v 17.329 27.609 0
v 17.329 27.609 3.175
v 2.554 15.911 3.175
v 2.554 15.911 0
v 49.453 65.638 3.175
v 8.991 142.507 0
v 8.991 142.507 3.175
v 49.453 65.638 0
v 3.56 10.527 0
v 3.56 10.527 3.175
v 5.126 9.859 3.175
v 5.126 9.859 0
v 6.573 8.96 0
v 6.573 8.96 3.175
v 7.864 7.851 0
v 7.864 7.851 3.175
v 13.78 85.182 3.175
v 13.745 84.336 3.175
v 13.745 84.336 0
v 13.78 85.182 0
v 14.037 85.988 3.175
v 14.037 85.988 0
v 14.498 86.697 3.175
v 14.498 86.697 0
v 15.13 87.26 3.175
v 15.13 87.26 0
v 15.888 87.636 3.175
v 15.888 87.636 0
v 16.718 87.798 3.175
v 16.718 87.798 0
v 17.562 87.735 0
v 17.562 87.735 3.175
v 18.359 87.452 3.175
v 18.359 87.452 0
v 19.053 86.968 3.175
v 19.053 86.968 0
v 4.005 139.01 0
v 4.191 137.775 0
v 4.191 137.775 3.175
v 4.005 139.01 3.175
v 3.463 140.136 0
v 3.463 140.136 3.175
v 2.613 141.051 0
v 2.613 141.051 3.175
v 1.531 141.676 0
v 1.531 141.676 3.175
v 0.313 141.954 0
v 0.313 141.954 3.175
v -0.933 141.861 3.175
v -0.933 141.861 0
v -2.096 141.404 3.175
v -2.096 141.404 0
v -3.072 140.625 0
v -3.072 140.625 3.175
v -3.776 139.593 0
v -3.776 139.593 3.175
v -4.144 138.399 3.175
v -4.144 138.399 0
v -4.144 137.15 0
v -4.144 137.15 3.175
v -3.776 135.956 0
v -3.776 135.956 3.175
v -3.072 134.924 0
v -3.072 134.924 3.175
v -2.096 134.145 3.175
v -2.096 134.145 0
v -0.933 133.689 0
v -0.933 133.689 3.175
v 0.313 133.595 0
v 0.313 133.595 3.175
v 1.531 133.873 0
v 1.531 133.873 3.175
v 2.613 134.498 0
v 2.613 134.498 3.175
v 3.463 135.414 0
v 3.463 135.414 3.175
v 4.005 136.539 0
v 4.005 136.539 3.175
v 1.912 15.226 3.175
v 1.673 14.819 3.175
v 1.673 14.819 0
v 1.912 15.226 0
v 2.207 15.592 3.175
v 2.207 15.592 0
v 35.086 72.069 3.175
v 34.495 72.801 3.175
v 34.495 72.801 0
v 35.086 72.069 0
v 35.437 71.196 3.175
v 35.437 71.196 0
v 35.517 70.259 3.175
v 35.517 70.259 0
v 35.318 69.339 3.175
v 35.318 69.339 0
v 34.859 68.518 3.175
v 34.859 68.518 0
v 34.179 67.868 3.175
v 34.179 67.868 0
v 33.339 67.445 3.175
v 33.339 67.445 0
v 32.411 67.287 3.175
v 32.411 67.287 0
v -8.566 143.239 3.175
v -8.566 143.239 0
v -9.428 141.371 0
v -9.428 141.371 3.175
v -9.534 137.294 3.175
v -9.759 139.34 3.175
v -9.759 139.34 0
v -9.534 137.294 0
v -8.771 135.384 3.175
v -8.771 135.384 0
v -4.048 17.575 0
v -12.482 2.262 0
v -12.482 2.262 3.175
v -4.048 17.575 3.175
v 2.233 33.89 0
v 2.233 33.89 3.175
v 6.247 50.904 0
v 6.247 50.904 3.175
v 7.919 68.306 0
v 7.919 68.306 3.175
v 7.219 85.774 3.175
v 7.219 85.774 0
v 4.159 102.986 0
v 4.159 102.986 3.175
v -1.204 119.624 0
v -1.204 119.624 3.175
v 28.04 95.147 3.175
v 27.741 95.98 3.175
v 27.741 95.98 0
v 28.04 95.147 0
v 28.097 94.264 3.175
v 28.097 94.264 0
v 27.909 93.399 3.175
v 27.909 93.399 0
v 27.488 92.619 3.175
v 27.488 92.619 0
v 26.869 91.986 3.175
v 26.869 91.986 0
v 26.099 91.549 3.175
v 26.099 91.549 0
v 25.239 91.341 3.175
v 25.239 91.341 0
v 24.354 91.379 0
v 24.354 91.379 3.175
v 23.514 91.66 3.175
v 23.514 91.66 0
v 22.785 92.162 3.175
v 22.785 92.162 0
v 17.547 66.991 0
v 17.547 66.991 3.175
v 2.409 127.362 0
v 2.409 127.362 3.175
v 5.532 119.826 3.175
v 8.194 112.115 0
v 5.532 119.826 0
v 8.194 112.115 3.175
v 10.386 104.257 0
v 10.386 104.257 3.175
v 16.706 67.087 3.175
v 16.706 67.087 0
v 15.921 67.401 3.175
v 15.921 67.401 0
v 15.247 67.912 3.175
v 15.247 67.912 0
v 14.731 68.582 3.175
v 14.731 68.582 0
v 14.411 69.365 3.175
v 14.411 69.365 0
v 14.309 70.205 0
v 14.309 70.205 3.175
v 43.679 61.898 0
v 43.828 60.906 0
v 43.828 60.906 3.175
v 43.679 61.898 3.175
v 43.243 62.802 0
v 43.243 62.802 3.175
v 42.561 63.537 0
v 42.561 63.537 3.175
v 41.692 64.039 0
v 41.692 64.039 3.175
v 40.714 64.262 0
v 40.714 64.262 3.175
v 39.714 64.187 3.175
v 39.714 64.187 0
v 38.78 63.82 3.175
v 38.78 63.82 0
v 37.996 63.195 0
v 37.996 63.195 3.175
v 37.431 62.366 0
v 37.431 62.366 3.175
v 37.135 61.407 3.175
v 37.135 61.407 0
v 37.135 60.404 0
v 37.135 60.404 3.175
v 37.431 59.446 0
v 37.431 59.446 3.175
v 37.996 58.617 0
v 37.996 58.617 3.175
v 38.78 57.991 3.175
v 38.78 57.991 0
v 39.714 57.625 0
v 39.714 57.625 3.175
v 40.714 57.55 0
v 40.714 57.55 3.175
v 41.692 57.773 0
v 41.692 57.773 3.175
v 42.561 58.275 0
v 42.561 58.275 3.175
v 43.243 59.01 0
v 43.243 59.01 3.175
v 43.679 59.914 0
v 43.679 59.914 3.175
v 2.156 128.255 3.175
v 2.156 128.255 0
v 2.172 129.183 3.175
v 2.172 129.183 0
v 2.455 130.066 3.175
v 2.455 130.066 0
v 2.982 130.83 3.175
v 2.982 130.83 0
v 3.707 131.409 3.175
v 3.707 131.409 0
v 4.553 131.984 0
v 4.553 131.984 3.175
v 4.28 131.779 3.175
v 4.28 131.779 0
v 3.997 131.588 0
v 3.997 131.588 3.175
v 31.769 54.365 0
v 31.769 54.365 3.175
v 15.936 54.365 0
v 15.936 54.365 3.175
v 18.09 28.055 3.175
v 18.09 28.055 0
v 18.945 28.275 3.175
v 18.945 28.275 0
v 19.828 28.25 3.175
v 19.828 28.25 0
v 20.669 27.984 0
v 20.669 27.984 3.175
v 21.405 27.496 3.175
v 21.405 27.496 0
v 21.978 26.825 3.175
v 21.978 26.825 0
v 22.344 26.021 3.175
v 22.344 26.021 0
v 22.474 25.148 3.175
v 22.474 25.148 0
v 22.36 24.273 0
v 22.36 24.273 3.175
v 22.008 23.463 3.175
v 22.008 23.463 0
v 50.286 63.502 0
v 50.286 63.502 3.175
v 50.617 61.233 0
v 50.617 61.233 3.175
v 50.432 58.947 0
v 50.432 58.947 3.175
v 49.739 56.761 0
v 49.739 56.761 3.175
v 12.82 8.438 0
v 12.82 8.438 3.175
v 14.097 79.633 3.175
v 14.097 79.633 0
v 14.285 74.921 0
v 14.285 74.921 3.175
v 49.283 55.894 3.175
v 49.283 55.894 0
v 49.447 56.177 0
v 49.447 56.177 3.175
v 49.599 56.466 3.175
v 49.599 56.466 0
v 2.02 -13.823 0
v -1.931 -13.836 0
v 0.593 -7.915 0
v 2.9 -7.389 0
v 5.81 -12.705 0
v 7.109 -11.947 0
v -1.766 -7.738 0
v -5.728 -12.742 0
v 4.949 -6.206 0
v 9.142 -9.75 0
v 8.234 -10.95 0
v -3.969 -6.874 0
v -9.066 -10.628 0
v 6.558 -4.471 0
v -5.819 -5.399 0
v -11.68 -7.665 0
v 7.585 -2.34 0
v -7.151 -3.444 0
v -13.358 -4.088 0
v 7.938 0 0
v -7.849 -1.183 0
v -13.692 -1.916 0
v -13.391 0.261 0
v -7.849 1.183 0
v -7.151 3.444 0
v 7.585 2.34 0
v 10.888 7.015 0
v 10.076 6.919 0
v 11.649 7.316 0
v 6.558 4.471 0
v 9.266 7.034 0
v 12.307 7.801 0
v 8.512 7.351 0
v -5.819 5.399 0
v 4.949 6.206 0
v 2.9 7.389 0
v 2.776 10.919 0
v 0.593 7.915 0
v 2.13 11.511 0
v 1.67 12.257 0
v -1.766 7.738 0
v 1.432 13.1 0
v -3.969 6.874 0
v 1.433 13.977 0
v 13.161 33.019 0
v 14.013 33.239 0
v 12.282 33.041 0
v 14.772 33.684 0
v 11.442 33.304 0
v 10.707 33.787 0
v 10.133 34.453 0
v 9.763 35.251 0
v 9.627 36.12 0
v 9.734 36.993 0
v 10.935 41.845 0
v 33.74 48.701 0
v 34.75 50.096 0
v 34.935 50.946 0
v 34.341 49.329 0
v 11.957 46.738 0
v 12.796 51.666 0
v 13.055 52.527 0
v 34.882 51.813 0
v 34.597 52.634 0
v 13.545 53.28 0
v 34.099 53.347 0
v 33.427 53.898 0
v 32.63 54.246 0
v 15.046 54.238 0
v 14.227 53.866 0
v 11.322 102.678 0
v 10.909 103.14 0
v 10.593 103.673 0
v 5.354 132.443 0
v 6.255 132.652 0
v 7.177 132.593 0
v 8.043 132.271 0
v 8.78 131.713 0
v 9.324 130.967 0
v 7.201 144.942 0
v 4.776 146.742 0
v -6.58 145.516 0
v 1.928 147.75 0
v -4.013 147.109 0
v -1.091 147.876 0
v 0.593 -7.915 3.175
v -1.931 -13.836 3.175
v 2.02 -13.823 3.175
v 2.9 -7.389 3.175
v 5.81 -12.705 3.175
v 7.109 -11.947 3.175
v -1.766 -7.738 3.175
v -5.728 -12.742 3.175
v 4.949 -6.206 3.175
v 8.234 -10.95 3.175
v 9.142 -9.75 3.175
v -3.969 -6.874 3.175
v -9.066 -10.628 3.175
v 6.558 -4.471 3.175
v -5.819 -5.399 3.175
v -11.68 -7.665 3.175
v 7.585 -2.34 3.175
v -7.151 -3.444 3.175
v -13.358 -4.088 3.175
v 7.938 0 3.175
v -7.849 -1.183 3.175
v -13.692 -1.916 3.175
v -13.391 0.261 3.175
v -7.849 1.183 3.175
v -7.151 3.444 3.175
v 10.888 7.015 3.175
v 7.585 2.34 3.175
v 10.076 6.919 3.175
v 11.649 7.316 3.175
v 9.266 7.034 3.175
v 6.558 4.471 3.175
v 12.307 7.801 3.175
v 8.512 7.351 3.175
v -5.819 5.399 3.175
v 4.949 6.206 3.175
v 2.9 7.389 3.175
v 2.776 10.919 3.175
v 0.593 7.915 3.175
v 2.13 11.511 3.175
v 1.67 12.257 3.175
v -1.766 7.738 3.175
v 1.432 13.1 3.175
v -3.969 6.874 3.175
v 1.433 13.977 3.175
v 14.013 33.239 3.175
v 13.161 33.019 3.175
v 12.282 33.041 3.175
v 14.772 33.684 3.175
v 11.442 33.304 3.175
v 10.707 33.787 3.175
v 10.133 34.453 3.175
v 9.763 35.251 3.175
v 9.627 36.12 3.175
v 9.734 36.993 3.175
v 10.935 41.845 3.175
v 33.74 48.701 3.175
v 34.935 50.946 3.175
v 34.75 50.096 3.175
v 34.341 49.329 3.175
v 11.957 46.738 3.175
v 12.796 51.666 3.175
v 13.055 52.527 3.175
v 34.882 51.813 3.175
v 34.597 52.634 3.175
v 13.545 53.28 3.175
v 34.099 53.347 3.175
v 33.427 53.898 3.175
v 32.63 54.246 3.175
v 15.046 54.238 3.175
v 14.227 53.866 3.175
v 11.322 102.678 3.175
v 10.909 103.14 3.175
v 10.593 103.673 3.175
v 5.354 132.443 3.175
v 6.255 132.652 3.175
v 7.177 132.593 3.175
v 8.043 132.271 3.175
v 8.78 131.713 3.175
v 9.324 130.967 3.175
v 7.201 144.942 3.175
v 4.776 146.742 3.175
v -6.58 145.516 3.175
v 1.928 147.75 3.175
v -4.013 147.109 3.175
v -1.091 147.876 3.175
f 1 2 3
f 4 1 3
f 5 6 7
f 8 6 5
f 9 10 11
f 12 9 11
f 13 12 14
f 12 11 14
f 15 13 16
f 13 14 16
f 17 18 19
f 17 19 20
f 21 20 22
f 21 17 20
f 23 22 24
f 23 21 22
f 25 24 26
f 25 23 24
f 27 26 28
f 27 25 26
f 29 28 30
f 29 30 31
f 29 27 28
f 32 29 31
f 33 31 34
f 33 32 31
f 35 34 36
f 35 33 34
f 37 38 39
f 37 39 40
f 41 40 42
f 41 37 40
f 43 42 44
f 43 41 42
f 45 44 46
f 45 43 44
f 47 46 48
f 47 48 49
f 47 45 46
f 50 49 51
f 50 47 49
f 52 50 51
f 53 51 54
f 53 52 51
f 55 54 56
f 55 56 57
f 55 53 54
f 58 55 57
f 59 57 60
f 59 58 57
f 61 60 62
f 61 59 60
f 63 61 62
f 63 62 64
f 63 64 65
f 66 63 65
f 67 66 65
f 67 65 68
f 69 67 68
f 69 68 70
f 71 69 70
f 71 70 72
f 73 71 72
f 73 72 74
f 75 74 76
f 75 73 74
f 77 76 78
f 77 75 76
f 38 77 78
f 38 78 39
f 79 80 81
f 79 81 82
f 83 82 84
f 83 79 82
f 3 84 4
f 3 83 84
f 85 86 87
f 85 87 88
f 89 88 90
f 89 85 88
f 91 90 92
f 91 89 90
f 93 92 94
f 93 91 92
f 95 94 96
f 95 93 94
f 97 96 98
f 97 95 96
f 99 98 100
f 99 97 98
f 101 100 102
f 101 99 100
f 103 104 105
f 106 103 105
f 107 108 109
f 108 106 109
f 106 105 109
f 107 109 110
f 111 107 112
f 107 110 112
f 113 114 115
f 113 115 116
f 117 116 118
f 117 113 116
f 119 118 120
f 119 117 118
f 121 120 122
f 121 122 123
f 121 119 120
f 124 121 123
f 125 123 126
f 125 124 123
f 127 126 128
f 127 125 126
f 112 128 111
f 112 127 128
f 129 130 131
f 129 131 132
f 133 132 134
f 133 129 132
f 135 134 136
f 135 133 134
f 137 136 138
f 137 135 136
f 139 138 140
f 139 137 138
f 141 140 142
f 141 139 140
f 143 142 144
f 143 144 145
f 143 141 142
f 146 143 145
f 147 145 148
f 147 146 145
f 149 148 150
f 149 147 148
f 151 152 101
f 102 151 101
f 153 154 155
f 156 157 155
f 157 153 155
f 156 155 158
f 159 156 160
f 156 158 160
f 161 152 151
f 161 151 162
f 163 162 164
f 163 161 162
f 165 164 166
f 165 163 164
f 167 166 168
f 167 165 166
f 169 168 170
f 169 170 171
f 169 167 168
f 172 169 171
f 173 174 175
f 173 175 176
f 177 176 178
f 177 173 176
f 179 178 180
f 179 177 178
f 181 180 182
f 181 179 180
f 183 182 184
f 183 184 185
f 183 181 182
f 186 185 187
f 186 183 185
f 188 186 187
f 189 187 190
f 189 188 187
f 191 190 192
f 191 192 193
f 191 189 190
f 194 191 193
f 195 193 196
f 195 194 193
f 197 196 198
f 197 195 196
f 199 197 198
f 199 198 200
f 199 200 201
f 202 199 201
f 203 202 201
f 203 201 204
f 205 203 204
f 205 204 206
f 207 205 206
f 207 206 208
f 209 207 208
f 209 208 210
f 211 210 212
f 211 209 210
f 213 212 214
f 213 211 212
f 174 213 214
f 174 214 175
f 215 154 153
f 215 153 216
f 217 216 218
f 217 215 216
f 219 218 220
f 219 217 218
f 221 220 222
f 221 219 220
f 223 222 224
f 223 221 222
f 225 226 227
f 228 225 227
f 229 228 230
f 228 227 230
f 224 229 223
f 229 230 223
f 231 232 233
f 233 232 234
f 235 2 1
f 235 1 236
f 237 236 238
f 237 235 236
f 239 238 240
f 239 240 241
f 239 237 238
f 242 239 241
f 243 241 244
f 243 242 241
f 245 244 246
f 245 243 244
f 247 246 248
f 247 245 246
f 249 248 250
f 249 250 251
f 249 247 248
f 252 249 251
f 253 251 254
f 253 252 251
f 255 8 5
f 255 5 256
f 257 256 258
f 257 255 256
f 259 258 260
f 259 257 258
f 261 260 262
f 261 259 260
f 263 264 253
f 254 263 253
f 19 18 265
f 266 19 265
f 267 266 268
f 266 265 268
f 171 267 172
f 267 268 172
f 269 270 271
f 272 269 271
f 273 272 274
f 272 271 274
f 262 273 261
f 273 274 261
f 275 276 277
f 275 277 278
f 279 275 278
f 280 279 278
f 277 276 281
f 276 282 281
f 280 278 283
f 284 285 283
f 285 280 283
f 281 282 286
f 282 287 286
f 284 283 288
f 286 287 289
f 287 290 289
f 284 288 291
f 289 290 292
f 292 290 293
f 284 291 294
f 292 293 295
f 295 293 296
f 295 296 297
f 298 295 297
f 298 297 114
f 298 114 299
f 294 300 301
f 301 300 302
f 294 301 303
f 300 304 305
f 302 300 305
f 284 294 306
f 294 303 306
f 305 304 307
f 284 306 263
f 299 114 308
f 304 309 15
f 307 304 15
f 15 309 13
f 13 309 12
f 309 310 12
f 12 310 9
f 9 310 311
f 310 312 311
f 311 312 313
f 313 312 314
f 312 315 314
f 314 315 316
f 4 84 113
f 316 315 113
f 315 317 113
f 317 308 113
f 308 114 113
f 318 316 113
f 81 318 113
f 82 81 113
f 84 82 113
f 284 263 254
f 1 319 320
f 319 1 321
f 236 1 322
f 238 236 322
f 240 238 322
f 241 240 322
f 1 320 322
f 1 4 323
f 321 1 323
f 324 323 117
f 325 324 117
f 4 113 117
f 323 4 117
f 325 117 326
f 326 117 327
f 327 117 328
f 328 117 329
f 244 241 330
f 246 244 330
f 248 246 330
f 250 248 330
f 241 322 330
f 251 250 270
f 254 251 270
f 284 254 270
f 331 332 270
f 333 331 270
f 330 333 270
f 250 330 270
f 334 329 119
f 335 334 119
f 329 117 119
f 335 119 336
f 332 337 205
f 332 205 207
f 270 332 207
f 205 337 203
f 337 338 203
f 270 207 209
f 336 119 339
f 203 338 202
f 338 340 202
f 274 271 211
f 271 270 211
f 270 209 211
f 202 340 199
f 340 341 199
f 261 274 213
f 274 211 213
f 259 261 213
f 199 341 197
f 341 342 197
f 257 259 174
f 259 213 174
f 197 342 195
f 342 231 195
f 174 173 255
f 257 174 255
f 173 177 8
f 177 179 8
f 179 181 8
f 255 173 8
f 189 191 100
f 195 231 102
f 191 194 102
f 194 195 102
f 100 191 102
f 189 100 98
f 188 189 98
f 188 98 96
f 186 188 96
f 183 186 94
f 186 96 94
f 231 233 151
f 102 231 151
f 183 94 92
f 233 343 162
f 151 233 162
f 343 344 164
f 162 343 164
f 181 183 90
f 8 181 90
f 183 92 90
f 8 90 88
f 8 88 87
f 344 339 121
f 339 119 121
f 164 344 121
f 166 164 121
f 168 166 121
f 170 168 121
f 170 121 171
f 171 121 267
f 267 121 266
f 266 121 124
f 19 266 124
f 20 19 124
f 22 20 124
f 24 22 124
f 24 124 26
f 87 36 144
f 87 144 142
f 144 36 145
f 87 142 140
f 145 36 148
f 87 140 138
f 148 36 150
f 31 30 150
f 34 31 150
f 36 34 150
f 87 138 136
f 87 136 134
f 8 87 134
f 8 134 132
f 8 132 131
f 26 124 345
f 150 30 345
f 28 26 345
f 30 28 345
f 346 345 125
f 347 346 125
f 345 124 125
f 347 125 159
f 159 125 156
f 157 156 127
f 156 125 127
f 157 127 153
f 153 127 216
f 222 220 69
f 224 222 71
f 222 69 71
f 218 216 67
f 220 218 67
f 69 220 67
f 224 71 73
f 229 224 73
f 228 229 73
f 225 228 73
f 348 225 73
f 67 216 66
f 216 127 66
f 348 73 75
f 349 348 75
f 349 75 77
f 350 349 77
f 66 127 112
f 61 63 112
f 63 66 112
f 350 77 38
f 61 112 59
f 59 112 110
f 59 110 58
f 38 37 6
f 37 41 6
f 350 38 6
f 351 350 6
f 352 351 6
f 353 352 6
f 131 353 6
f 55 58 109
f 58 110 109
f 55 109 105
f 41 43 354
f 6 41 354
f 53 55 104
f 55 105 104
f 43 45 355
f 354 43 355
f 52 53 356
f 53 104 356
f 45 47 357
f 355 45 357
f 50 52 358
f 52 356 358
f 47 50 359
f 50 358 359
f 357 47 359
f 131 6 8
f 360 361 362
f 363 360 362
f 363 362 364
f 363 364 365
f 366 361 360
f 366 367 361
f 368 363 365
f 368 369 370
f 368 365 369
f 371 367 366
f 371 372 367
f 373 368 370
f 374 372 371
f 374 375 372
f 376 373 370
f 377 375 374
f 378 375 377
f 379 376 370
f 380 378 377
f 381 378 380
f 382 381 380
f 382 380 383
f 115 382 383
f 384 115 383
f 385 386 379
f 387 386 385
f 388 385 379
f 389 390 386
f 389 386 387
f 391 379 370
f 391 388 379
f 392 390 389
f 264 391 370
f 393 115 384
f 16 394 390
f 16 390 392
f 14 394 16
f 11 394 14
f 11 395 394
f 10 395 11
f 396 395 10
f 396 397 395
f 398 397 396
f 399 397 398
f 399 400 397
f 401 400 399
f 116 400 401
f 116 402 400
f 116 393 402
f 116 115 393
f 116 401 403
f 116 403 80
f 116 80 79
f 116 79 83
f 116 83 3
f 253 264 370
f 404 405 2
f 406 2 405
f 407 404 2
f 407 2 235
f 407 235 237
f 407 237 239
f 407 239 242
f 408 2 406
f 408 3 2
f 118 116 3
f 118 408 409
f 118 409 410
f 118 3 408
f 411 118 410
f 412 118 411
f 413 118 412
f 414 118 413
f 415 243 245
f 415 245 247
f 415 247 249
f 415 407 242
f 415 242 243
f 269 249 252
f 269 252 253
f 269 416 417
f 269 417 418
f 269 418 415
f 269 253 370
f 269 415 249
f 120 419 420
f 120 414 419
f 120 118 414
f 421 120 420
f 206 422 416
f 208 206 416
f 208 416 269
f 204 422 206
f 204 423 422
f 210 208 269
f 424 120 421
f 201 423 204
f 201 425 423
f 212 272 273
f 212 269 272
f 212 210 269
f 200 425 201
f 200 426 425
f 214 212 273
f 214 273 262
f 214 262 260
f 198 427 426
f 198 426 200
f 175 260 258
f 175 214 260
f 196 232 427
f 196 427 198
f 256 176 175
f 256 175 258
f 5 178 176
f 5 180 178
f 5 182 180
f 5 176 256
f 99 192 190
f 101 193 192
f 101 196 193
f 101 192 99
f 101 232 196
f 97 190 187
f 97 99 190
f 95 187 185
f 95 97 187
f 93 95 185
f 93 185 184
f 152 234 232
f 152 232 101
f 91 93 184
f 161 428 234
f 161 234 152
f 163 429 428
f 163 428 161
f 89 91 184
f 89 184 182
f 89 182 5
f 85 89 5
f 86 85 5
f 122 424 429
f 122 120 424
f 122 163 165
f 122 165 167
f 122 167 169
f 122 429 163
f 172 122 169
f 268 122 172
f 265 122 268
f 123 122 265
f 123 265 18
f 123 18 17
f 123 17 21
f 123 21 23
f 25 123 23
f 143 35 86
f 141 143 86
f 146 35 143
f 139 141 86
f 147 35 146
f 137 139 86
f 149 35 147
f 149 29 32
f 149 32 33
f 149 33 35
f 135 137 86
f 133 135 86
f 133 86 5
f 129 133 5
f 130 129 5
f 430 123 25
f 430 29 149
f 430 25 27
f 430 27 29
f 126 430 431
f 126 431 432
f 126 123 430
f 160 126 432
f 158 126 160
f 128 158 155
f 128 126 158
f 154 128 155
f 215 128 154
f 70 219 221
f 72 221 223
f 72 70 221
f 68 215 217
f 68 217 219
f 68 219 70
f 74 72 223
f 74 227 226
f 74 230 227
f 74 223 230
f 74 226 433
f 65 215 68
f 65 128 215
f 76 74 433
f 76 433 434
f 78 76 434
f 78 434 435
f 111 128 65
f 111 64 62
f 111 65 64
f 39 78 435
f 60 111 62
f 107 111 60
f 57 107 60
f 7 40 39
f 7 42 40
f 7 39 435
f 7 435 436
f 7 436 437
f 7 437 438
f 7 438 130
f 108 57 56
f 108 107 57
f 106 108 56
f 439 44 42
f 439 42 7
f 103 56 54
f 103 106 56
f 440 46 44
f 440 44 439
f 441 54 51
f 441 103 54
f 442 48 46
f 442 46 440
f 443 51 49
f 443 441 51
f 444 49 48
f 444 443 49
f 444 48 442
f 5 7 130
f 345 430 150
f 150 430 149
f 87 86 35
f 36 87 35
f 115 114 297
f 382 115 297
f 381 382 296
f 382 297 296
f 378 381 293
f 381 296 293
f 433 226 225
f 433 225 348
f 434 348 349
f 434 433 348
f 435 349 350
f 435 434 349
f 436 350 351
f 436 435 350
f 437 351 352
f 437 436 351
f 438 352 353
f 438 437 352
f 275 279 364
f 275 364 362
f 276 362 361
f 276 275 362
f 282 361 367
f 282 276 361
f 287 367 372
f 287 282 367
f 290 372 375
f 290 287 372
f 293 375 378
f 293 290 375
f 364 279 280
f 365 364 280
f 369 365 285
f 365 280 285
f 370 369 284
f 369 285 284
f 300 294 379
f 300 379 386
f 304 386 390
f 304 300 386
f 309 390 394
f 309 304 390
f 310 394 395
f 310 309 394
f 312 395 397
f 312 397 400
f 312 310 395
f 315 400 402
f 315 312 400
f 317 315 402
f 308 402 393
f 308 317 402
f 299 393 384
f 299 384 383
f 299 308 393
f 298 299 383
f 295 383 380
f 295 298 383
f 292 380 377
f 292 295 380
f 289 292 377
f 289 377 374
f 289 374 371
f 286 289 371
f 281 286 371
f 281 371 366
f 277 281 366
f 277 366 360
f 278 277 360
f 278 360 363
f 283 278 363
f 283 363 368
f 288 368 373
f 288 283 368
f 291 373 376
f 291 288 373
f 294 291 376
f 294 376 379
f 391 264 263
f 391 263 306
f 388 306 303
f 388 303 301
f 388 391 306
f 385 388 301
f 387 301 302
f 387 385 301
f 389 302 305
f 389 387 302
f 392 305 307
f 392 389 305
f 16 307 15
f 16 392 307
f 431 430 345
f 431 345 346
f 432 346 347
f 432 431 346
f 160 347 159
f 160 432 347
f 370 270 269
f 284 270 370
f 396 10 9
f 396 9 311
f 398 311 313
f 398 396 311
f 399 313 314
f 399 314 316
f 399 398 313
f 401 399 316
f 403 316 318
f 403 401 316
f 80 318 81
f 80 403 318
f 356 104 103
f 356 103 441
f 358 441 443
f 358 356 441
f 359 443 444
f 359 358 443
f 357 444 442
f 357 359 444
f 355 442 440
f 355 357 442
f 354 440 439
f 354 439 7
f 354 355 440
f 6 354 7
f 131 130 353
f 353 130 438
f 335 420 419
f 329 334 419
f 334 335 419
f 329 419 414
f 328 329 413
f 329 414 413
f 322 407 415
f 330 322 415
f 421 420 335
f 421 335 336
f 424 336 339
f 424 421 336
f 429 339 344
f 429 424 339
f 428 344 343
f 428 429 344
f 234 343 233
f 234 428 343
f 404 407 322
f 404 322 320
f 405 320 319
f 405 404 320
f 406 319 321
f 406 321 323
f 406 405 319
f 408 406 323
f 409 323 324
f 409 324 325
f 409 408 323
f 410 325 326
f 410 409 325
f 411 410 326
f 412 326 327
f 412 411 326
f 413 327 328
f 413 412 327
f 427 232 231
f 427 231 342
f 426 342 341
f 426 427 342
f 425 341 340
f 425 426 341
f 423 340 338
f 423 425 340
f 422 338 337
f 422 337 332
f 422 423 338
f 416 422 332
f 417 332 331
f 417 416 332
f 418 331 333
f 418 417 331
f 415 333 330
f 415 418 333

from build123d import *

# Parameters (mm, degrees)
SKETCH1_R           = 7.9375
SKETCH1_R_2         = 3.3655
SKETCH1_R_3         = 4.191
BOSS_EXTRUDE1_DEPTH = 3.175
CUT_EXTRUDE1_DEPTH  = 6.35
FILLET1_R           = 3.175
FILLET5_R           = 7.62


with BuildPart() as part:
    # Sketch1 → Boss-Extrude1 (new body)
    with BuildSketch(Plane.XY):
        with BuildLine():
            Line((8.990505701, 142.507164257), (49.453246099, 65.638340515))
            ThreePointArc((49.453246099, 65.638340515), (50.622740399, 60.905856258), (49.453246099, 56.173372001))
            Line((49.453246099, 56.173372001), (8.177790267, -11.326281223))
            ThreePointArc((8.177790267, -11.326281223), (-6.360706327, -12.437938536), (-13.97, 0))
            ThreePointArc((-13.97, 0), (7.91990549, 68.33468047), (-10.16, 137.77468))
            ThreePointArc((-10.16, 137.77468), (-2.437423033, 147.637974022), (8.990505701, 142.507164257))
        make_face()
        Circle(SKETCH1_R, mode=Mode.SUBTRACT)
        with Locations((40.462740399, 60.905856258)):
            Circle(SKETCH1_R_2, mode=Mode.SUBTRACT)
        with Locations((0, 137.77468)):
            Circle(SKETCH1_R_3, mode=Mode.SUBTRACT)
    extrude(amount=BOSS_EXTRUDE1_DEPTH)

    # Sketch2 → Cut-Extrude1 (cut)
    with BuildSketch(Plane.XY.offset(3.175)):
        with BuildLine():
            ThreePointArc((-0.124257687, 11.111805266), (6.119551738, 9.275707131), (10.264347662, 4.258030452))
            Line((10.264347662, 4.258030452), (31.313727824, 38.681050934))
            Line((31.313727824, 38.681050934), (1.961287607, 15.442397513))
            ThreePointArc((1.961287607, 15.442397513), (0.937773258, 13.267826895), (-0.124257687, 11.111805266))
        make_face()
        with BuildLine():
            Line((6.763206822, 27.343322009), (40.914079215, 54.38094756))
            ThreePointArc((40.914079215, 54.38094756), (40.688544415, 54.369255246), (40.462740399, 54.365356258))
            Line((40.462740399, 54.365356258), (13.177274796, 54.365356258))
            ThreePointArc((13.177274796, 54.365356258), (10.666365072, 40.689104041), (6.763206822, 27.343322009))
        make_face()
        with BuildLine():
            Line((14.227692925, 66.924652484), (40.332379532, 67.445056996))
            Line((40.332379532, 67.445056996), (12.691282428, 92.804736539))
            ThreePointArc((12.691282428, 92.804736539), (14.081637817, 79.901629399), (14.227692925, 66.924652484))
        make_face()
        with BuildLine():
            Line((10.611239694, 103.330724773), (36.257061309, 79.801636355))
            Line((36.257061309, 79.801636355), (6.979807085, 135.420906636))
            ThreePointArc((6.979807085, 135.420906636), (4.67858985, 132.085325641), (0.961351613, 130.471683418))
            ThreePointArc((0.961351613, 130.471683418), (6.511625183, 117.159092878), (10.611239694, 103.330724773))
        make_face()
    extrude(amount=-CUT_EXTRUDE1_DEPTH, mode=Mode.SUBTRACT)

    # Fillet1
    # the kernel refuses this fillet: 3.175 mm, written as the material it adds along each edge
    with BuildSketch(Plane(origin=(1.961287607, 15.442397513, 3.175), x_dir=(-0.42030668038784, -0.9073821104812206, 0), z_dir=(0, 0, -1))) as fillet1_piece_1:
        with BuildLine():
            CenterArc((0.755742265, -3.174987871), FILLET1_R, 90.158373023, 26.618624782)
            Line((-0.674656078, -0.340453415), (0, 0))
            ThreePointArc((0, 0), (0.373483081, -0.000516178), (0.746966162, 0))
        make_face()
    extrude(amount=3.175)
    with BuildSketch(Plane(origin=(-0.124257687, 11.111805266, 3.175), x_dir=(0.4359761911813302, 0.8999581994309626, 0), z_dir=(0, 0, -1))) as fillet1_piece_2:
        with BuildLine():
            CenterArc((4.22998716, 3.174619998), FILLET1_R, 172.83641486, 96.277116616)
            ThreePointArc((1.07977071, 3.570550945), (0.690776023, 1.739644609), (0, 0))
            ThreePointArc((0, 0), (2.090433086, 0.016171698), (4.180866173, 0))
        make_face()
    extrude(amount=3.175)
    with BuildSketch(Plane(origin=(10.264347662, 4.258030452, 3.175), x_dir=(0.5216861951219568, 0.853137453063207, 0), z_dir=(0, 0, -1))) as fillet1_piece_3:
        with BuildLine():
            CenterArc((4.899209013, -3.175), FILLET1_R, 90, 103.603922827)
            ThreePointArc((1.813283958, -3.921787493), (1.099083544, -1.871916155), (0, 0))
            Line((0, 0), (4.899209013, 0))
        make_face()
    extrude(amount=3.175)
    with BuildSketch(Plane(origin=(31.313727824, 38.681050934, 3.175), x_dir=(-0.7840288614357019, -0.6207243707442435, 0), z_dir=(0, 0, -1))) as fillet1_piece_4:
        with BuildLine():
            CenterArc((FILLET1_R * 5.61807899766, -FILLET1_R), FILLET1_R, 90, 159.814477423)
            Line((FILLET1_R * 5.27301794688, -FILLET1_R * 1.9385802423), (0, 0))
            Line((0, 0), (FILLET1_R * 5.61807899766, 0))
        make_face()
    extrude(amount=3.175)
    with BuildSketch(Plane(origin=(40.914079215, 54.38094756, 3.175), x_dir=(-0.9999985466583668, -0.0017048991624346568, 0), z_dir=(0, 0, -1))) as fillet1_piece_5:
        with BuildLine():
            CenterArc((9.150412322, -3.174995386), FILLET1_R, 90.097683574, 141.630948821)
            Line((7.1838593, -5.667643418), (6.987203998, -5.916908221))
            Line((6.987203998, -5.916908221), (-0.196655302, -0.249264803))
            Line((-0.196655302, -0.249264803), (0.021369604, 0.316780034))
            ThreePointArc((0.021369604, 0.316780034), (0.450823437, 0.302677747), (9.144457961, 0.317499539))
            Line((9.144457961, 0.317499539), (9.144999267, 0))
        make_face()
    extrude(amount=3.175)
    with BuildSketch(Plane(origin=(6.763206822, 27.343322009, 3.175), x_dir=(0.29421486221715376, 0.9557393027654252, 0), z_dir=(0, 0, -1))) as fillet1_piece_6:
        with BuildLine():
            CenterArc((10.215496918, 3.172783065), FILLET1_R, 124.520485767, 143.338263429)
            Line((8.41622168, 5.788740561), (0, 0))
            ThreePointArc((0, 0), (5.048434414, 0.094345715), (10.096868828, 0))
        make_face()
    extrude(amount=3.175)
    with BuildSketch(Plane(origin=(13.177274796, 54.365356258, 3.175), x_dir=(-0.1397274976091422, -0.9901899951079526, 0), z_dir=(0, 0, -1))) as fillet1_piece_7:
        with BuildLine():
            CenterArc((2.758448164, -3.174838407), FILLET1_R, 90.57806828, 81.3898537)
            Line((-0.38540507, -2.731203602), (0, 0))
            ThreePointArc((0, 0), (1.363207757, -0.006876893), (2.726415514, 0))
        make_face()
    extrude(amount=3.175)
    with BuildSketch(Plane(origin=(12.691282428, 92.804736539, 3.175), x_dir=(0.12348134501551586, -0.992346893698549, 0), z_dir=(0, 0, -1))) as fillet1_piece_8:
        with BuildLine():
            CenterArc((8.634113181, -3.173416471), FILLET1_R, 91.809659599, 137.818629886)
            Line((6.577526563, -5.59231632), (0, 0))
            ThreePointArc((0, 0), (4.266924504, -0.06738998), (8.533849008, 0))
        make_face()
    extrude(amount=3.175)
    with BuildSketch(Plane(origin=(14.227692925, 66.924652484, 3.175), x_dir=(0.024643115282951916, 0.9996963123214726, 0), z_dir=(0, 0, -1))) as fillet1_piece_9:
        with BuildLine():
            CenterArc((3.319776694, 3.174765946), FILLET1_R, 177.445853815, 91.858439002)
            Line((0.147930885, 3.316255051), (0, 0))
            ThreePointArc((0, 0), (1.640612791, 0.009960595), (3.281225581, 0))
        make_face()
    extrude(amount=3.175)
    with BuildSketch(Plane(origin=(40.332379532, 67.445056996, 3.175), x_dir=(-0.7368618420904852, 0.6760433607920552, 0), z_dir=(0, 0, -1))) as fillet1_piece_10:
        with BuildLine():
            CenterArc((FILLET1_R * 2.49529647453, -FILLET1_R), FILLET1_R, 90, 136.322717601)
            Line((FILLET1_R * 1.80470077201, -FILLET1_R * 1.72324102183), (0, 0))
            Line((0, 0), (FILLET1_R * 2.49529647453, 0))
        make_face()
    extrude(amount=3.175)
    with BuildSketch(Plane(origin=(36.257061309, 79.801636355, 3.175), x_dir=(-0.736861842090485, 0.6760433607920552, 0), z_dir=(0, 0, -1))) as fillet1_piece_11:
        with BuildLine():
            CenterArc((FILLET1_R * 5.75850458875, FILLET1_R), FILLET1_R, 109.70304414, 160.29695586)
            Line((FILLET1_R * 5.42135931021, FILLET1_R * 1.94145263352), (0, 0))
            Line((0, 0), (FILLET1_R * 5.75850458875, 0))
        make_face()
    extrude(amount=3.175)
    with BuildSketch(Plane(origin=(10.611239694, 103.330724773, 3.175), x_dir=(0.7368618420904525, -0.6760433607920909, 0), z_dir=(0, 0, -1))) as fillet1_piece_12:
        with BuildLine():
            CenterArc((0.964871334, -3.175), FILLET1_R, 90, 33.606646982)
            ThreePointArc((-0.792453619, -0.530678913), (-0.395758583, -0.266038651), (0, 0))
            Line((0, 0), (0.964871334, 0))
        make_face()
    extrude(amount=3.175)
    with BuildSketch(Plane(origin=(0.961351613, 130.471683418, 3.175), x_dir=(0.42205519537851754, -0.9065701363126856, 0), z_dir=(0, 0, -1))) as fillet1_piece_13:
        with BuildLine():
            CenterArc((3.47040448, -3.174744224), FILLET1_R, 90.727275071, 84.025505032)
            ThreePointArc((0.308709742, -2.884379996), (0.297748154, -1.426842886), (0, 0))
            ThreePointArc((0, 0), (1.715052097, -0.01088502), (3.430104193, 0))
        make_face()
    extrude(amount=3.175)
    with BuildSketch(Plane(origin=(6.979807085, 135.420906636, 3.175), x_dir=(-0.5768732919878915, -0.8168336458490512, 0), z_dir=(0, 0, -1))) as fillet1_piece_14:
        with BuildLine():
            CenterArc((5.114466288, -3.042745801), FILLET1_R, 106.595474978, 100.411869016)
            Line((2.285705354, -4.484528231), (0, 0))
            ThreePointArc((0, 0), (2.103823012, -0.306829742), (4.207646024, 0))
        make_face()
    extrude(amount=3.175)

    # Fillet5
    # the kernel refuses this fillet: 7.62 mm, written as the material it takes off along each edge
    with BuildSketch(Plane(origin=(49.453246099, 56.173372001, -1.634441158), x_dir=(0.4370839848417488, 0.8994206970016078, 0), z_dir=(0, 0, 1))) as fillet5_piece_1:
        with BuildLine():
            CenterArc((0.40861029, 7.616054986), FILLET5_R, 264.472549142, 7.371205669)
            Line((-0.325368255, 0.031486739), (0, 0))
            ThreePointArc((0, 0), (0.326888232, -0.005260019), (0.653776463, 0))
        make_face()
    extrude(amount=6.443882317, mode=Mode.SUBTRACT)
    with BuildSketch(Plane(origin=(8.177790267, -11.326281223, -6.850611907), x_dir=(-0.8642606797046686, -0.5030442103000734, 0), z_dir=(0, 0, 1))) as fillet5_piece_2:
        with BuildLine():
            CenterArc((1.992905282, -7.583263394), FILLET5_R, 84.371608536, 33.981356684)
            Line((-1.625847463, -0.877368333), (0, 0))
            ThreePointArc((0, 0), (1.370122381, 0.067350445), (2.740244763, 0))
        make_face()
    extrude(amount=16.876223814, mode=Mode.SUBTRACT)
    with BuildSketch(Plane(origin=(-13.97, 0, -10.334031649), x_dir=(0.5495701737634485, 0.8354475591619218, 0), z_dir=(0, 0, 1))) as fillet5_piece_3:
        with BuildLine():
            CenterArc((2.78803259, -7.619578759), FILLET5_R, 90.602458764, 49.750903142)
            ThreePointArc((-3.079322695, -2.757630389), (-1.64222079, -1.264291645), (0, 0))
            ThreePointArc((0, 0), (1.353955306, -0.00711841), (2.707910612, 0))
        make_face()
    extrude(amount=23.843063299, mode=Mode.SUBTRACT)
    with BuildSketch(Plane(origin=(-10.16, 137.77468, -14.229821855), x_dir=(0.28011460344612044, 0.9599665665720981, 0), z_dir=(0, 0, 1))) as fillet5_piece_4:
        with BuildLine():
            CenterArc((3.557455464, -7.314945237), FILLET5_R, 73.732955283, 62.075524842)
            ThreePointArc((-1.906189574, -2.003355748), (-0.947716818, -1.006795003), (0, 0))
            ThreePointArc((0, 0), (2.845964371, 0.406739684), (5.691928742, 0))
        make_face()
    extrude(amount=31.63464371, mode=Mode.SUBTRACT)


solid = part.part
